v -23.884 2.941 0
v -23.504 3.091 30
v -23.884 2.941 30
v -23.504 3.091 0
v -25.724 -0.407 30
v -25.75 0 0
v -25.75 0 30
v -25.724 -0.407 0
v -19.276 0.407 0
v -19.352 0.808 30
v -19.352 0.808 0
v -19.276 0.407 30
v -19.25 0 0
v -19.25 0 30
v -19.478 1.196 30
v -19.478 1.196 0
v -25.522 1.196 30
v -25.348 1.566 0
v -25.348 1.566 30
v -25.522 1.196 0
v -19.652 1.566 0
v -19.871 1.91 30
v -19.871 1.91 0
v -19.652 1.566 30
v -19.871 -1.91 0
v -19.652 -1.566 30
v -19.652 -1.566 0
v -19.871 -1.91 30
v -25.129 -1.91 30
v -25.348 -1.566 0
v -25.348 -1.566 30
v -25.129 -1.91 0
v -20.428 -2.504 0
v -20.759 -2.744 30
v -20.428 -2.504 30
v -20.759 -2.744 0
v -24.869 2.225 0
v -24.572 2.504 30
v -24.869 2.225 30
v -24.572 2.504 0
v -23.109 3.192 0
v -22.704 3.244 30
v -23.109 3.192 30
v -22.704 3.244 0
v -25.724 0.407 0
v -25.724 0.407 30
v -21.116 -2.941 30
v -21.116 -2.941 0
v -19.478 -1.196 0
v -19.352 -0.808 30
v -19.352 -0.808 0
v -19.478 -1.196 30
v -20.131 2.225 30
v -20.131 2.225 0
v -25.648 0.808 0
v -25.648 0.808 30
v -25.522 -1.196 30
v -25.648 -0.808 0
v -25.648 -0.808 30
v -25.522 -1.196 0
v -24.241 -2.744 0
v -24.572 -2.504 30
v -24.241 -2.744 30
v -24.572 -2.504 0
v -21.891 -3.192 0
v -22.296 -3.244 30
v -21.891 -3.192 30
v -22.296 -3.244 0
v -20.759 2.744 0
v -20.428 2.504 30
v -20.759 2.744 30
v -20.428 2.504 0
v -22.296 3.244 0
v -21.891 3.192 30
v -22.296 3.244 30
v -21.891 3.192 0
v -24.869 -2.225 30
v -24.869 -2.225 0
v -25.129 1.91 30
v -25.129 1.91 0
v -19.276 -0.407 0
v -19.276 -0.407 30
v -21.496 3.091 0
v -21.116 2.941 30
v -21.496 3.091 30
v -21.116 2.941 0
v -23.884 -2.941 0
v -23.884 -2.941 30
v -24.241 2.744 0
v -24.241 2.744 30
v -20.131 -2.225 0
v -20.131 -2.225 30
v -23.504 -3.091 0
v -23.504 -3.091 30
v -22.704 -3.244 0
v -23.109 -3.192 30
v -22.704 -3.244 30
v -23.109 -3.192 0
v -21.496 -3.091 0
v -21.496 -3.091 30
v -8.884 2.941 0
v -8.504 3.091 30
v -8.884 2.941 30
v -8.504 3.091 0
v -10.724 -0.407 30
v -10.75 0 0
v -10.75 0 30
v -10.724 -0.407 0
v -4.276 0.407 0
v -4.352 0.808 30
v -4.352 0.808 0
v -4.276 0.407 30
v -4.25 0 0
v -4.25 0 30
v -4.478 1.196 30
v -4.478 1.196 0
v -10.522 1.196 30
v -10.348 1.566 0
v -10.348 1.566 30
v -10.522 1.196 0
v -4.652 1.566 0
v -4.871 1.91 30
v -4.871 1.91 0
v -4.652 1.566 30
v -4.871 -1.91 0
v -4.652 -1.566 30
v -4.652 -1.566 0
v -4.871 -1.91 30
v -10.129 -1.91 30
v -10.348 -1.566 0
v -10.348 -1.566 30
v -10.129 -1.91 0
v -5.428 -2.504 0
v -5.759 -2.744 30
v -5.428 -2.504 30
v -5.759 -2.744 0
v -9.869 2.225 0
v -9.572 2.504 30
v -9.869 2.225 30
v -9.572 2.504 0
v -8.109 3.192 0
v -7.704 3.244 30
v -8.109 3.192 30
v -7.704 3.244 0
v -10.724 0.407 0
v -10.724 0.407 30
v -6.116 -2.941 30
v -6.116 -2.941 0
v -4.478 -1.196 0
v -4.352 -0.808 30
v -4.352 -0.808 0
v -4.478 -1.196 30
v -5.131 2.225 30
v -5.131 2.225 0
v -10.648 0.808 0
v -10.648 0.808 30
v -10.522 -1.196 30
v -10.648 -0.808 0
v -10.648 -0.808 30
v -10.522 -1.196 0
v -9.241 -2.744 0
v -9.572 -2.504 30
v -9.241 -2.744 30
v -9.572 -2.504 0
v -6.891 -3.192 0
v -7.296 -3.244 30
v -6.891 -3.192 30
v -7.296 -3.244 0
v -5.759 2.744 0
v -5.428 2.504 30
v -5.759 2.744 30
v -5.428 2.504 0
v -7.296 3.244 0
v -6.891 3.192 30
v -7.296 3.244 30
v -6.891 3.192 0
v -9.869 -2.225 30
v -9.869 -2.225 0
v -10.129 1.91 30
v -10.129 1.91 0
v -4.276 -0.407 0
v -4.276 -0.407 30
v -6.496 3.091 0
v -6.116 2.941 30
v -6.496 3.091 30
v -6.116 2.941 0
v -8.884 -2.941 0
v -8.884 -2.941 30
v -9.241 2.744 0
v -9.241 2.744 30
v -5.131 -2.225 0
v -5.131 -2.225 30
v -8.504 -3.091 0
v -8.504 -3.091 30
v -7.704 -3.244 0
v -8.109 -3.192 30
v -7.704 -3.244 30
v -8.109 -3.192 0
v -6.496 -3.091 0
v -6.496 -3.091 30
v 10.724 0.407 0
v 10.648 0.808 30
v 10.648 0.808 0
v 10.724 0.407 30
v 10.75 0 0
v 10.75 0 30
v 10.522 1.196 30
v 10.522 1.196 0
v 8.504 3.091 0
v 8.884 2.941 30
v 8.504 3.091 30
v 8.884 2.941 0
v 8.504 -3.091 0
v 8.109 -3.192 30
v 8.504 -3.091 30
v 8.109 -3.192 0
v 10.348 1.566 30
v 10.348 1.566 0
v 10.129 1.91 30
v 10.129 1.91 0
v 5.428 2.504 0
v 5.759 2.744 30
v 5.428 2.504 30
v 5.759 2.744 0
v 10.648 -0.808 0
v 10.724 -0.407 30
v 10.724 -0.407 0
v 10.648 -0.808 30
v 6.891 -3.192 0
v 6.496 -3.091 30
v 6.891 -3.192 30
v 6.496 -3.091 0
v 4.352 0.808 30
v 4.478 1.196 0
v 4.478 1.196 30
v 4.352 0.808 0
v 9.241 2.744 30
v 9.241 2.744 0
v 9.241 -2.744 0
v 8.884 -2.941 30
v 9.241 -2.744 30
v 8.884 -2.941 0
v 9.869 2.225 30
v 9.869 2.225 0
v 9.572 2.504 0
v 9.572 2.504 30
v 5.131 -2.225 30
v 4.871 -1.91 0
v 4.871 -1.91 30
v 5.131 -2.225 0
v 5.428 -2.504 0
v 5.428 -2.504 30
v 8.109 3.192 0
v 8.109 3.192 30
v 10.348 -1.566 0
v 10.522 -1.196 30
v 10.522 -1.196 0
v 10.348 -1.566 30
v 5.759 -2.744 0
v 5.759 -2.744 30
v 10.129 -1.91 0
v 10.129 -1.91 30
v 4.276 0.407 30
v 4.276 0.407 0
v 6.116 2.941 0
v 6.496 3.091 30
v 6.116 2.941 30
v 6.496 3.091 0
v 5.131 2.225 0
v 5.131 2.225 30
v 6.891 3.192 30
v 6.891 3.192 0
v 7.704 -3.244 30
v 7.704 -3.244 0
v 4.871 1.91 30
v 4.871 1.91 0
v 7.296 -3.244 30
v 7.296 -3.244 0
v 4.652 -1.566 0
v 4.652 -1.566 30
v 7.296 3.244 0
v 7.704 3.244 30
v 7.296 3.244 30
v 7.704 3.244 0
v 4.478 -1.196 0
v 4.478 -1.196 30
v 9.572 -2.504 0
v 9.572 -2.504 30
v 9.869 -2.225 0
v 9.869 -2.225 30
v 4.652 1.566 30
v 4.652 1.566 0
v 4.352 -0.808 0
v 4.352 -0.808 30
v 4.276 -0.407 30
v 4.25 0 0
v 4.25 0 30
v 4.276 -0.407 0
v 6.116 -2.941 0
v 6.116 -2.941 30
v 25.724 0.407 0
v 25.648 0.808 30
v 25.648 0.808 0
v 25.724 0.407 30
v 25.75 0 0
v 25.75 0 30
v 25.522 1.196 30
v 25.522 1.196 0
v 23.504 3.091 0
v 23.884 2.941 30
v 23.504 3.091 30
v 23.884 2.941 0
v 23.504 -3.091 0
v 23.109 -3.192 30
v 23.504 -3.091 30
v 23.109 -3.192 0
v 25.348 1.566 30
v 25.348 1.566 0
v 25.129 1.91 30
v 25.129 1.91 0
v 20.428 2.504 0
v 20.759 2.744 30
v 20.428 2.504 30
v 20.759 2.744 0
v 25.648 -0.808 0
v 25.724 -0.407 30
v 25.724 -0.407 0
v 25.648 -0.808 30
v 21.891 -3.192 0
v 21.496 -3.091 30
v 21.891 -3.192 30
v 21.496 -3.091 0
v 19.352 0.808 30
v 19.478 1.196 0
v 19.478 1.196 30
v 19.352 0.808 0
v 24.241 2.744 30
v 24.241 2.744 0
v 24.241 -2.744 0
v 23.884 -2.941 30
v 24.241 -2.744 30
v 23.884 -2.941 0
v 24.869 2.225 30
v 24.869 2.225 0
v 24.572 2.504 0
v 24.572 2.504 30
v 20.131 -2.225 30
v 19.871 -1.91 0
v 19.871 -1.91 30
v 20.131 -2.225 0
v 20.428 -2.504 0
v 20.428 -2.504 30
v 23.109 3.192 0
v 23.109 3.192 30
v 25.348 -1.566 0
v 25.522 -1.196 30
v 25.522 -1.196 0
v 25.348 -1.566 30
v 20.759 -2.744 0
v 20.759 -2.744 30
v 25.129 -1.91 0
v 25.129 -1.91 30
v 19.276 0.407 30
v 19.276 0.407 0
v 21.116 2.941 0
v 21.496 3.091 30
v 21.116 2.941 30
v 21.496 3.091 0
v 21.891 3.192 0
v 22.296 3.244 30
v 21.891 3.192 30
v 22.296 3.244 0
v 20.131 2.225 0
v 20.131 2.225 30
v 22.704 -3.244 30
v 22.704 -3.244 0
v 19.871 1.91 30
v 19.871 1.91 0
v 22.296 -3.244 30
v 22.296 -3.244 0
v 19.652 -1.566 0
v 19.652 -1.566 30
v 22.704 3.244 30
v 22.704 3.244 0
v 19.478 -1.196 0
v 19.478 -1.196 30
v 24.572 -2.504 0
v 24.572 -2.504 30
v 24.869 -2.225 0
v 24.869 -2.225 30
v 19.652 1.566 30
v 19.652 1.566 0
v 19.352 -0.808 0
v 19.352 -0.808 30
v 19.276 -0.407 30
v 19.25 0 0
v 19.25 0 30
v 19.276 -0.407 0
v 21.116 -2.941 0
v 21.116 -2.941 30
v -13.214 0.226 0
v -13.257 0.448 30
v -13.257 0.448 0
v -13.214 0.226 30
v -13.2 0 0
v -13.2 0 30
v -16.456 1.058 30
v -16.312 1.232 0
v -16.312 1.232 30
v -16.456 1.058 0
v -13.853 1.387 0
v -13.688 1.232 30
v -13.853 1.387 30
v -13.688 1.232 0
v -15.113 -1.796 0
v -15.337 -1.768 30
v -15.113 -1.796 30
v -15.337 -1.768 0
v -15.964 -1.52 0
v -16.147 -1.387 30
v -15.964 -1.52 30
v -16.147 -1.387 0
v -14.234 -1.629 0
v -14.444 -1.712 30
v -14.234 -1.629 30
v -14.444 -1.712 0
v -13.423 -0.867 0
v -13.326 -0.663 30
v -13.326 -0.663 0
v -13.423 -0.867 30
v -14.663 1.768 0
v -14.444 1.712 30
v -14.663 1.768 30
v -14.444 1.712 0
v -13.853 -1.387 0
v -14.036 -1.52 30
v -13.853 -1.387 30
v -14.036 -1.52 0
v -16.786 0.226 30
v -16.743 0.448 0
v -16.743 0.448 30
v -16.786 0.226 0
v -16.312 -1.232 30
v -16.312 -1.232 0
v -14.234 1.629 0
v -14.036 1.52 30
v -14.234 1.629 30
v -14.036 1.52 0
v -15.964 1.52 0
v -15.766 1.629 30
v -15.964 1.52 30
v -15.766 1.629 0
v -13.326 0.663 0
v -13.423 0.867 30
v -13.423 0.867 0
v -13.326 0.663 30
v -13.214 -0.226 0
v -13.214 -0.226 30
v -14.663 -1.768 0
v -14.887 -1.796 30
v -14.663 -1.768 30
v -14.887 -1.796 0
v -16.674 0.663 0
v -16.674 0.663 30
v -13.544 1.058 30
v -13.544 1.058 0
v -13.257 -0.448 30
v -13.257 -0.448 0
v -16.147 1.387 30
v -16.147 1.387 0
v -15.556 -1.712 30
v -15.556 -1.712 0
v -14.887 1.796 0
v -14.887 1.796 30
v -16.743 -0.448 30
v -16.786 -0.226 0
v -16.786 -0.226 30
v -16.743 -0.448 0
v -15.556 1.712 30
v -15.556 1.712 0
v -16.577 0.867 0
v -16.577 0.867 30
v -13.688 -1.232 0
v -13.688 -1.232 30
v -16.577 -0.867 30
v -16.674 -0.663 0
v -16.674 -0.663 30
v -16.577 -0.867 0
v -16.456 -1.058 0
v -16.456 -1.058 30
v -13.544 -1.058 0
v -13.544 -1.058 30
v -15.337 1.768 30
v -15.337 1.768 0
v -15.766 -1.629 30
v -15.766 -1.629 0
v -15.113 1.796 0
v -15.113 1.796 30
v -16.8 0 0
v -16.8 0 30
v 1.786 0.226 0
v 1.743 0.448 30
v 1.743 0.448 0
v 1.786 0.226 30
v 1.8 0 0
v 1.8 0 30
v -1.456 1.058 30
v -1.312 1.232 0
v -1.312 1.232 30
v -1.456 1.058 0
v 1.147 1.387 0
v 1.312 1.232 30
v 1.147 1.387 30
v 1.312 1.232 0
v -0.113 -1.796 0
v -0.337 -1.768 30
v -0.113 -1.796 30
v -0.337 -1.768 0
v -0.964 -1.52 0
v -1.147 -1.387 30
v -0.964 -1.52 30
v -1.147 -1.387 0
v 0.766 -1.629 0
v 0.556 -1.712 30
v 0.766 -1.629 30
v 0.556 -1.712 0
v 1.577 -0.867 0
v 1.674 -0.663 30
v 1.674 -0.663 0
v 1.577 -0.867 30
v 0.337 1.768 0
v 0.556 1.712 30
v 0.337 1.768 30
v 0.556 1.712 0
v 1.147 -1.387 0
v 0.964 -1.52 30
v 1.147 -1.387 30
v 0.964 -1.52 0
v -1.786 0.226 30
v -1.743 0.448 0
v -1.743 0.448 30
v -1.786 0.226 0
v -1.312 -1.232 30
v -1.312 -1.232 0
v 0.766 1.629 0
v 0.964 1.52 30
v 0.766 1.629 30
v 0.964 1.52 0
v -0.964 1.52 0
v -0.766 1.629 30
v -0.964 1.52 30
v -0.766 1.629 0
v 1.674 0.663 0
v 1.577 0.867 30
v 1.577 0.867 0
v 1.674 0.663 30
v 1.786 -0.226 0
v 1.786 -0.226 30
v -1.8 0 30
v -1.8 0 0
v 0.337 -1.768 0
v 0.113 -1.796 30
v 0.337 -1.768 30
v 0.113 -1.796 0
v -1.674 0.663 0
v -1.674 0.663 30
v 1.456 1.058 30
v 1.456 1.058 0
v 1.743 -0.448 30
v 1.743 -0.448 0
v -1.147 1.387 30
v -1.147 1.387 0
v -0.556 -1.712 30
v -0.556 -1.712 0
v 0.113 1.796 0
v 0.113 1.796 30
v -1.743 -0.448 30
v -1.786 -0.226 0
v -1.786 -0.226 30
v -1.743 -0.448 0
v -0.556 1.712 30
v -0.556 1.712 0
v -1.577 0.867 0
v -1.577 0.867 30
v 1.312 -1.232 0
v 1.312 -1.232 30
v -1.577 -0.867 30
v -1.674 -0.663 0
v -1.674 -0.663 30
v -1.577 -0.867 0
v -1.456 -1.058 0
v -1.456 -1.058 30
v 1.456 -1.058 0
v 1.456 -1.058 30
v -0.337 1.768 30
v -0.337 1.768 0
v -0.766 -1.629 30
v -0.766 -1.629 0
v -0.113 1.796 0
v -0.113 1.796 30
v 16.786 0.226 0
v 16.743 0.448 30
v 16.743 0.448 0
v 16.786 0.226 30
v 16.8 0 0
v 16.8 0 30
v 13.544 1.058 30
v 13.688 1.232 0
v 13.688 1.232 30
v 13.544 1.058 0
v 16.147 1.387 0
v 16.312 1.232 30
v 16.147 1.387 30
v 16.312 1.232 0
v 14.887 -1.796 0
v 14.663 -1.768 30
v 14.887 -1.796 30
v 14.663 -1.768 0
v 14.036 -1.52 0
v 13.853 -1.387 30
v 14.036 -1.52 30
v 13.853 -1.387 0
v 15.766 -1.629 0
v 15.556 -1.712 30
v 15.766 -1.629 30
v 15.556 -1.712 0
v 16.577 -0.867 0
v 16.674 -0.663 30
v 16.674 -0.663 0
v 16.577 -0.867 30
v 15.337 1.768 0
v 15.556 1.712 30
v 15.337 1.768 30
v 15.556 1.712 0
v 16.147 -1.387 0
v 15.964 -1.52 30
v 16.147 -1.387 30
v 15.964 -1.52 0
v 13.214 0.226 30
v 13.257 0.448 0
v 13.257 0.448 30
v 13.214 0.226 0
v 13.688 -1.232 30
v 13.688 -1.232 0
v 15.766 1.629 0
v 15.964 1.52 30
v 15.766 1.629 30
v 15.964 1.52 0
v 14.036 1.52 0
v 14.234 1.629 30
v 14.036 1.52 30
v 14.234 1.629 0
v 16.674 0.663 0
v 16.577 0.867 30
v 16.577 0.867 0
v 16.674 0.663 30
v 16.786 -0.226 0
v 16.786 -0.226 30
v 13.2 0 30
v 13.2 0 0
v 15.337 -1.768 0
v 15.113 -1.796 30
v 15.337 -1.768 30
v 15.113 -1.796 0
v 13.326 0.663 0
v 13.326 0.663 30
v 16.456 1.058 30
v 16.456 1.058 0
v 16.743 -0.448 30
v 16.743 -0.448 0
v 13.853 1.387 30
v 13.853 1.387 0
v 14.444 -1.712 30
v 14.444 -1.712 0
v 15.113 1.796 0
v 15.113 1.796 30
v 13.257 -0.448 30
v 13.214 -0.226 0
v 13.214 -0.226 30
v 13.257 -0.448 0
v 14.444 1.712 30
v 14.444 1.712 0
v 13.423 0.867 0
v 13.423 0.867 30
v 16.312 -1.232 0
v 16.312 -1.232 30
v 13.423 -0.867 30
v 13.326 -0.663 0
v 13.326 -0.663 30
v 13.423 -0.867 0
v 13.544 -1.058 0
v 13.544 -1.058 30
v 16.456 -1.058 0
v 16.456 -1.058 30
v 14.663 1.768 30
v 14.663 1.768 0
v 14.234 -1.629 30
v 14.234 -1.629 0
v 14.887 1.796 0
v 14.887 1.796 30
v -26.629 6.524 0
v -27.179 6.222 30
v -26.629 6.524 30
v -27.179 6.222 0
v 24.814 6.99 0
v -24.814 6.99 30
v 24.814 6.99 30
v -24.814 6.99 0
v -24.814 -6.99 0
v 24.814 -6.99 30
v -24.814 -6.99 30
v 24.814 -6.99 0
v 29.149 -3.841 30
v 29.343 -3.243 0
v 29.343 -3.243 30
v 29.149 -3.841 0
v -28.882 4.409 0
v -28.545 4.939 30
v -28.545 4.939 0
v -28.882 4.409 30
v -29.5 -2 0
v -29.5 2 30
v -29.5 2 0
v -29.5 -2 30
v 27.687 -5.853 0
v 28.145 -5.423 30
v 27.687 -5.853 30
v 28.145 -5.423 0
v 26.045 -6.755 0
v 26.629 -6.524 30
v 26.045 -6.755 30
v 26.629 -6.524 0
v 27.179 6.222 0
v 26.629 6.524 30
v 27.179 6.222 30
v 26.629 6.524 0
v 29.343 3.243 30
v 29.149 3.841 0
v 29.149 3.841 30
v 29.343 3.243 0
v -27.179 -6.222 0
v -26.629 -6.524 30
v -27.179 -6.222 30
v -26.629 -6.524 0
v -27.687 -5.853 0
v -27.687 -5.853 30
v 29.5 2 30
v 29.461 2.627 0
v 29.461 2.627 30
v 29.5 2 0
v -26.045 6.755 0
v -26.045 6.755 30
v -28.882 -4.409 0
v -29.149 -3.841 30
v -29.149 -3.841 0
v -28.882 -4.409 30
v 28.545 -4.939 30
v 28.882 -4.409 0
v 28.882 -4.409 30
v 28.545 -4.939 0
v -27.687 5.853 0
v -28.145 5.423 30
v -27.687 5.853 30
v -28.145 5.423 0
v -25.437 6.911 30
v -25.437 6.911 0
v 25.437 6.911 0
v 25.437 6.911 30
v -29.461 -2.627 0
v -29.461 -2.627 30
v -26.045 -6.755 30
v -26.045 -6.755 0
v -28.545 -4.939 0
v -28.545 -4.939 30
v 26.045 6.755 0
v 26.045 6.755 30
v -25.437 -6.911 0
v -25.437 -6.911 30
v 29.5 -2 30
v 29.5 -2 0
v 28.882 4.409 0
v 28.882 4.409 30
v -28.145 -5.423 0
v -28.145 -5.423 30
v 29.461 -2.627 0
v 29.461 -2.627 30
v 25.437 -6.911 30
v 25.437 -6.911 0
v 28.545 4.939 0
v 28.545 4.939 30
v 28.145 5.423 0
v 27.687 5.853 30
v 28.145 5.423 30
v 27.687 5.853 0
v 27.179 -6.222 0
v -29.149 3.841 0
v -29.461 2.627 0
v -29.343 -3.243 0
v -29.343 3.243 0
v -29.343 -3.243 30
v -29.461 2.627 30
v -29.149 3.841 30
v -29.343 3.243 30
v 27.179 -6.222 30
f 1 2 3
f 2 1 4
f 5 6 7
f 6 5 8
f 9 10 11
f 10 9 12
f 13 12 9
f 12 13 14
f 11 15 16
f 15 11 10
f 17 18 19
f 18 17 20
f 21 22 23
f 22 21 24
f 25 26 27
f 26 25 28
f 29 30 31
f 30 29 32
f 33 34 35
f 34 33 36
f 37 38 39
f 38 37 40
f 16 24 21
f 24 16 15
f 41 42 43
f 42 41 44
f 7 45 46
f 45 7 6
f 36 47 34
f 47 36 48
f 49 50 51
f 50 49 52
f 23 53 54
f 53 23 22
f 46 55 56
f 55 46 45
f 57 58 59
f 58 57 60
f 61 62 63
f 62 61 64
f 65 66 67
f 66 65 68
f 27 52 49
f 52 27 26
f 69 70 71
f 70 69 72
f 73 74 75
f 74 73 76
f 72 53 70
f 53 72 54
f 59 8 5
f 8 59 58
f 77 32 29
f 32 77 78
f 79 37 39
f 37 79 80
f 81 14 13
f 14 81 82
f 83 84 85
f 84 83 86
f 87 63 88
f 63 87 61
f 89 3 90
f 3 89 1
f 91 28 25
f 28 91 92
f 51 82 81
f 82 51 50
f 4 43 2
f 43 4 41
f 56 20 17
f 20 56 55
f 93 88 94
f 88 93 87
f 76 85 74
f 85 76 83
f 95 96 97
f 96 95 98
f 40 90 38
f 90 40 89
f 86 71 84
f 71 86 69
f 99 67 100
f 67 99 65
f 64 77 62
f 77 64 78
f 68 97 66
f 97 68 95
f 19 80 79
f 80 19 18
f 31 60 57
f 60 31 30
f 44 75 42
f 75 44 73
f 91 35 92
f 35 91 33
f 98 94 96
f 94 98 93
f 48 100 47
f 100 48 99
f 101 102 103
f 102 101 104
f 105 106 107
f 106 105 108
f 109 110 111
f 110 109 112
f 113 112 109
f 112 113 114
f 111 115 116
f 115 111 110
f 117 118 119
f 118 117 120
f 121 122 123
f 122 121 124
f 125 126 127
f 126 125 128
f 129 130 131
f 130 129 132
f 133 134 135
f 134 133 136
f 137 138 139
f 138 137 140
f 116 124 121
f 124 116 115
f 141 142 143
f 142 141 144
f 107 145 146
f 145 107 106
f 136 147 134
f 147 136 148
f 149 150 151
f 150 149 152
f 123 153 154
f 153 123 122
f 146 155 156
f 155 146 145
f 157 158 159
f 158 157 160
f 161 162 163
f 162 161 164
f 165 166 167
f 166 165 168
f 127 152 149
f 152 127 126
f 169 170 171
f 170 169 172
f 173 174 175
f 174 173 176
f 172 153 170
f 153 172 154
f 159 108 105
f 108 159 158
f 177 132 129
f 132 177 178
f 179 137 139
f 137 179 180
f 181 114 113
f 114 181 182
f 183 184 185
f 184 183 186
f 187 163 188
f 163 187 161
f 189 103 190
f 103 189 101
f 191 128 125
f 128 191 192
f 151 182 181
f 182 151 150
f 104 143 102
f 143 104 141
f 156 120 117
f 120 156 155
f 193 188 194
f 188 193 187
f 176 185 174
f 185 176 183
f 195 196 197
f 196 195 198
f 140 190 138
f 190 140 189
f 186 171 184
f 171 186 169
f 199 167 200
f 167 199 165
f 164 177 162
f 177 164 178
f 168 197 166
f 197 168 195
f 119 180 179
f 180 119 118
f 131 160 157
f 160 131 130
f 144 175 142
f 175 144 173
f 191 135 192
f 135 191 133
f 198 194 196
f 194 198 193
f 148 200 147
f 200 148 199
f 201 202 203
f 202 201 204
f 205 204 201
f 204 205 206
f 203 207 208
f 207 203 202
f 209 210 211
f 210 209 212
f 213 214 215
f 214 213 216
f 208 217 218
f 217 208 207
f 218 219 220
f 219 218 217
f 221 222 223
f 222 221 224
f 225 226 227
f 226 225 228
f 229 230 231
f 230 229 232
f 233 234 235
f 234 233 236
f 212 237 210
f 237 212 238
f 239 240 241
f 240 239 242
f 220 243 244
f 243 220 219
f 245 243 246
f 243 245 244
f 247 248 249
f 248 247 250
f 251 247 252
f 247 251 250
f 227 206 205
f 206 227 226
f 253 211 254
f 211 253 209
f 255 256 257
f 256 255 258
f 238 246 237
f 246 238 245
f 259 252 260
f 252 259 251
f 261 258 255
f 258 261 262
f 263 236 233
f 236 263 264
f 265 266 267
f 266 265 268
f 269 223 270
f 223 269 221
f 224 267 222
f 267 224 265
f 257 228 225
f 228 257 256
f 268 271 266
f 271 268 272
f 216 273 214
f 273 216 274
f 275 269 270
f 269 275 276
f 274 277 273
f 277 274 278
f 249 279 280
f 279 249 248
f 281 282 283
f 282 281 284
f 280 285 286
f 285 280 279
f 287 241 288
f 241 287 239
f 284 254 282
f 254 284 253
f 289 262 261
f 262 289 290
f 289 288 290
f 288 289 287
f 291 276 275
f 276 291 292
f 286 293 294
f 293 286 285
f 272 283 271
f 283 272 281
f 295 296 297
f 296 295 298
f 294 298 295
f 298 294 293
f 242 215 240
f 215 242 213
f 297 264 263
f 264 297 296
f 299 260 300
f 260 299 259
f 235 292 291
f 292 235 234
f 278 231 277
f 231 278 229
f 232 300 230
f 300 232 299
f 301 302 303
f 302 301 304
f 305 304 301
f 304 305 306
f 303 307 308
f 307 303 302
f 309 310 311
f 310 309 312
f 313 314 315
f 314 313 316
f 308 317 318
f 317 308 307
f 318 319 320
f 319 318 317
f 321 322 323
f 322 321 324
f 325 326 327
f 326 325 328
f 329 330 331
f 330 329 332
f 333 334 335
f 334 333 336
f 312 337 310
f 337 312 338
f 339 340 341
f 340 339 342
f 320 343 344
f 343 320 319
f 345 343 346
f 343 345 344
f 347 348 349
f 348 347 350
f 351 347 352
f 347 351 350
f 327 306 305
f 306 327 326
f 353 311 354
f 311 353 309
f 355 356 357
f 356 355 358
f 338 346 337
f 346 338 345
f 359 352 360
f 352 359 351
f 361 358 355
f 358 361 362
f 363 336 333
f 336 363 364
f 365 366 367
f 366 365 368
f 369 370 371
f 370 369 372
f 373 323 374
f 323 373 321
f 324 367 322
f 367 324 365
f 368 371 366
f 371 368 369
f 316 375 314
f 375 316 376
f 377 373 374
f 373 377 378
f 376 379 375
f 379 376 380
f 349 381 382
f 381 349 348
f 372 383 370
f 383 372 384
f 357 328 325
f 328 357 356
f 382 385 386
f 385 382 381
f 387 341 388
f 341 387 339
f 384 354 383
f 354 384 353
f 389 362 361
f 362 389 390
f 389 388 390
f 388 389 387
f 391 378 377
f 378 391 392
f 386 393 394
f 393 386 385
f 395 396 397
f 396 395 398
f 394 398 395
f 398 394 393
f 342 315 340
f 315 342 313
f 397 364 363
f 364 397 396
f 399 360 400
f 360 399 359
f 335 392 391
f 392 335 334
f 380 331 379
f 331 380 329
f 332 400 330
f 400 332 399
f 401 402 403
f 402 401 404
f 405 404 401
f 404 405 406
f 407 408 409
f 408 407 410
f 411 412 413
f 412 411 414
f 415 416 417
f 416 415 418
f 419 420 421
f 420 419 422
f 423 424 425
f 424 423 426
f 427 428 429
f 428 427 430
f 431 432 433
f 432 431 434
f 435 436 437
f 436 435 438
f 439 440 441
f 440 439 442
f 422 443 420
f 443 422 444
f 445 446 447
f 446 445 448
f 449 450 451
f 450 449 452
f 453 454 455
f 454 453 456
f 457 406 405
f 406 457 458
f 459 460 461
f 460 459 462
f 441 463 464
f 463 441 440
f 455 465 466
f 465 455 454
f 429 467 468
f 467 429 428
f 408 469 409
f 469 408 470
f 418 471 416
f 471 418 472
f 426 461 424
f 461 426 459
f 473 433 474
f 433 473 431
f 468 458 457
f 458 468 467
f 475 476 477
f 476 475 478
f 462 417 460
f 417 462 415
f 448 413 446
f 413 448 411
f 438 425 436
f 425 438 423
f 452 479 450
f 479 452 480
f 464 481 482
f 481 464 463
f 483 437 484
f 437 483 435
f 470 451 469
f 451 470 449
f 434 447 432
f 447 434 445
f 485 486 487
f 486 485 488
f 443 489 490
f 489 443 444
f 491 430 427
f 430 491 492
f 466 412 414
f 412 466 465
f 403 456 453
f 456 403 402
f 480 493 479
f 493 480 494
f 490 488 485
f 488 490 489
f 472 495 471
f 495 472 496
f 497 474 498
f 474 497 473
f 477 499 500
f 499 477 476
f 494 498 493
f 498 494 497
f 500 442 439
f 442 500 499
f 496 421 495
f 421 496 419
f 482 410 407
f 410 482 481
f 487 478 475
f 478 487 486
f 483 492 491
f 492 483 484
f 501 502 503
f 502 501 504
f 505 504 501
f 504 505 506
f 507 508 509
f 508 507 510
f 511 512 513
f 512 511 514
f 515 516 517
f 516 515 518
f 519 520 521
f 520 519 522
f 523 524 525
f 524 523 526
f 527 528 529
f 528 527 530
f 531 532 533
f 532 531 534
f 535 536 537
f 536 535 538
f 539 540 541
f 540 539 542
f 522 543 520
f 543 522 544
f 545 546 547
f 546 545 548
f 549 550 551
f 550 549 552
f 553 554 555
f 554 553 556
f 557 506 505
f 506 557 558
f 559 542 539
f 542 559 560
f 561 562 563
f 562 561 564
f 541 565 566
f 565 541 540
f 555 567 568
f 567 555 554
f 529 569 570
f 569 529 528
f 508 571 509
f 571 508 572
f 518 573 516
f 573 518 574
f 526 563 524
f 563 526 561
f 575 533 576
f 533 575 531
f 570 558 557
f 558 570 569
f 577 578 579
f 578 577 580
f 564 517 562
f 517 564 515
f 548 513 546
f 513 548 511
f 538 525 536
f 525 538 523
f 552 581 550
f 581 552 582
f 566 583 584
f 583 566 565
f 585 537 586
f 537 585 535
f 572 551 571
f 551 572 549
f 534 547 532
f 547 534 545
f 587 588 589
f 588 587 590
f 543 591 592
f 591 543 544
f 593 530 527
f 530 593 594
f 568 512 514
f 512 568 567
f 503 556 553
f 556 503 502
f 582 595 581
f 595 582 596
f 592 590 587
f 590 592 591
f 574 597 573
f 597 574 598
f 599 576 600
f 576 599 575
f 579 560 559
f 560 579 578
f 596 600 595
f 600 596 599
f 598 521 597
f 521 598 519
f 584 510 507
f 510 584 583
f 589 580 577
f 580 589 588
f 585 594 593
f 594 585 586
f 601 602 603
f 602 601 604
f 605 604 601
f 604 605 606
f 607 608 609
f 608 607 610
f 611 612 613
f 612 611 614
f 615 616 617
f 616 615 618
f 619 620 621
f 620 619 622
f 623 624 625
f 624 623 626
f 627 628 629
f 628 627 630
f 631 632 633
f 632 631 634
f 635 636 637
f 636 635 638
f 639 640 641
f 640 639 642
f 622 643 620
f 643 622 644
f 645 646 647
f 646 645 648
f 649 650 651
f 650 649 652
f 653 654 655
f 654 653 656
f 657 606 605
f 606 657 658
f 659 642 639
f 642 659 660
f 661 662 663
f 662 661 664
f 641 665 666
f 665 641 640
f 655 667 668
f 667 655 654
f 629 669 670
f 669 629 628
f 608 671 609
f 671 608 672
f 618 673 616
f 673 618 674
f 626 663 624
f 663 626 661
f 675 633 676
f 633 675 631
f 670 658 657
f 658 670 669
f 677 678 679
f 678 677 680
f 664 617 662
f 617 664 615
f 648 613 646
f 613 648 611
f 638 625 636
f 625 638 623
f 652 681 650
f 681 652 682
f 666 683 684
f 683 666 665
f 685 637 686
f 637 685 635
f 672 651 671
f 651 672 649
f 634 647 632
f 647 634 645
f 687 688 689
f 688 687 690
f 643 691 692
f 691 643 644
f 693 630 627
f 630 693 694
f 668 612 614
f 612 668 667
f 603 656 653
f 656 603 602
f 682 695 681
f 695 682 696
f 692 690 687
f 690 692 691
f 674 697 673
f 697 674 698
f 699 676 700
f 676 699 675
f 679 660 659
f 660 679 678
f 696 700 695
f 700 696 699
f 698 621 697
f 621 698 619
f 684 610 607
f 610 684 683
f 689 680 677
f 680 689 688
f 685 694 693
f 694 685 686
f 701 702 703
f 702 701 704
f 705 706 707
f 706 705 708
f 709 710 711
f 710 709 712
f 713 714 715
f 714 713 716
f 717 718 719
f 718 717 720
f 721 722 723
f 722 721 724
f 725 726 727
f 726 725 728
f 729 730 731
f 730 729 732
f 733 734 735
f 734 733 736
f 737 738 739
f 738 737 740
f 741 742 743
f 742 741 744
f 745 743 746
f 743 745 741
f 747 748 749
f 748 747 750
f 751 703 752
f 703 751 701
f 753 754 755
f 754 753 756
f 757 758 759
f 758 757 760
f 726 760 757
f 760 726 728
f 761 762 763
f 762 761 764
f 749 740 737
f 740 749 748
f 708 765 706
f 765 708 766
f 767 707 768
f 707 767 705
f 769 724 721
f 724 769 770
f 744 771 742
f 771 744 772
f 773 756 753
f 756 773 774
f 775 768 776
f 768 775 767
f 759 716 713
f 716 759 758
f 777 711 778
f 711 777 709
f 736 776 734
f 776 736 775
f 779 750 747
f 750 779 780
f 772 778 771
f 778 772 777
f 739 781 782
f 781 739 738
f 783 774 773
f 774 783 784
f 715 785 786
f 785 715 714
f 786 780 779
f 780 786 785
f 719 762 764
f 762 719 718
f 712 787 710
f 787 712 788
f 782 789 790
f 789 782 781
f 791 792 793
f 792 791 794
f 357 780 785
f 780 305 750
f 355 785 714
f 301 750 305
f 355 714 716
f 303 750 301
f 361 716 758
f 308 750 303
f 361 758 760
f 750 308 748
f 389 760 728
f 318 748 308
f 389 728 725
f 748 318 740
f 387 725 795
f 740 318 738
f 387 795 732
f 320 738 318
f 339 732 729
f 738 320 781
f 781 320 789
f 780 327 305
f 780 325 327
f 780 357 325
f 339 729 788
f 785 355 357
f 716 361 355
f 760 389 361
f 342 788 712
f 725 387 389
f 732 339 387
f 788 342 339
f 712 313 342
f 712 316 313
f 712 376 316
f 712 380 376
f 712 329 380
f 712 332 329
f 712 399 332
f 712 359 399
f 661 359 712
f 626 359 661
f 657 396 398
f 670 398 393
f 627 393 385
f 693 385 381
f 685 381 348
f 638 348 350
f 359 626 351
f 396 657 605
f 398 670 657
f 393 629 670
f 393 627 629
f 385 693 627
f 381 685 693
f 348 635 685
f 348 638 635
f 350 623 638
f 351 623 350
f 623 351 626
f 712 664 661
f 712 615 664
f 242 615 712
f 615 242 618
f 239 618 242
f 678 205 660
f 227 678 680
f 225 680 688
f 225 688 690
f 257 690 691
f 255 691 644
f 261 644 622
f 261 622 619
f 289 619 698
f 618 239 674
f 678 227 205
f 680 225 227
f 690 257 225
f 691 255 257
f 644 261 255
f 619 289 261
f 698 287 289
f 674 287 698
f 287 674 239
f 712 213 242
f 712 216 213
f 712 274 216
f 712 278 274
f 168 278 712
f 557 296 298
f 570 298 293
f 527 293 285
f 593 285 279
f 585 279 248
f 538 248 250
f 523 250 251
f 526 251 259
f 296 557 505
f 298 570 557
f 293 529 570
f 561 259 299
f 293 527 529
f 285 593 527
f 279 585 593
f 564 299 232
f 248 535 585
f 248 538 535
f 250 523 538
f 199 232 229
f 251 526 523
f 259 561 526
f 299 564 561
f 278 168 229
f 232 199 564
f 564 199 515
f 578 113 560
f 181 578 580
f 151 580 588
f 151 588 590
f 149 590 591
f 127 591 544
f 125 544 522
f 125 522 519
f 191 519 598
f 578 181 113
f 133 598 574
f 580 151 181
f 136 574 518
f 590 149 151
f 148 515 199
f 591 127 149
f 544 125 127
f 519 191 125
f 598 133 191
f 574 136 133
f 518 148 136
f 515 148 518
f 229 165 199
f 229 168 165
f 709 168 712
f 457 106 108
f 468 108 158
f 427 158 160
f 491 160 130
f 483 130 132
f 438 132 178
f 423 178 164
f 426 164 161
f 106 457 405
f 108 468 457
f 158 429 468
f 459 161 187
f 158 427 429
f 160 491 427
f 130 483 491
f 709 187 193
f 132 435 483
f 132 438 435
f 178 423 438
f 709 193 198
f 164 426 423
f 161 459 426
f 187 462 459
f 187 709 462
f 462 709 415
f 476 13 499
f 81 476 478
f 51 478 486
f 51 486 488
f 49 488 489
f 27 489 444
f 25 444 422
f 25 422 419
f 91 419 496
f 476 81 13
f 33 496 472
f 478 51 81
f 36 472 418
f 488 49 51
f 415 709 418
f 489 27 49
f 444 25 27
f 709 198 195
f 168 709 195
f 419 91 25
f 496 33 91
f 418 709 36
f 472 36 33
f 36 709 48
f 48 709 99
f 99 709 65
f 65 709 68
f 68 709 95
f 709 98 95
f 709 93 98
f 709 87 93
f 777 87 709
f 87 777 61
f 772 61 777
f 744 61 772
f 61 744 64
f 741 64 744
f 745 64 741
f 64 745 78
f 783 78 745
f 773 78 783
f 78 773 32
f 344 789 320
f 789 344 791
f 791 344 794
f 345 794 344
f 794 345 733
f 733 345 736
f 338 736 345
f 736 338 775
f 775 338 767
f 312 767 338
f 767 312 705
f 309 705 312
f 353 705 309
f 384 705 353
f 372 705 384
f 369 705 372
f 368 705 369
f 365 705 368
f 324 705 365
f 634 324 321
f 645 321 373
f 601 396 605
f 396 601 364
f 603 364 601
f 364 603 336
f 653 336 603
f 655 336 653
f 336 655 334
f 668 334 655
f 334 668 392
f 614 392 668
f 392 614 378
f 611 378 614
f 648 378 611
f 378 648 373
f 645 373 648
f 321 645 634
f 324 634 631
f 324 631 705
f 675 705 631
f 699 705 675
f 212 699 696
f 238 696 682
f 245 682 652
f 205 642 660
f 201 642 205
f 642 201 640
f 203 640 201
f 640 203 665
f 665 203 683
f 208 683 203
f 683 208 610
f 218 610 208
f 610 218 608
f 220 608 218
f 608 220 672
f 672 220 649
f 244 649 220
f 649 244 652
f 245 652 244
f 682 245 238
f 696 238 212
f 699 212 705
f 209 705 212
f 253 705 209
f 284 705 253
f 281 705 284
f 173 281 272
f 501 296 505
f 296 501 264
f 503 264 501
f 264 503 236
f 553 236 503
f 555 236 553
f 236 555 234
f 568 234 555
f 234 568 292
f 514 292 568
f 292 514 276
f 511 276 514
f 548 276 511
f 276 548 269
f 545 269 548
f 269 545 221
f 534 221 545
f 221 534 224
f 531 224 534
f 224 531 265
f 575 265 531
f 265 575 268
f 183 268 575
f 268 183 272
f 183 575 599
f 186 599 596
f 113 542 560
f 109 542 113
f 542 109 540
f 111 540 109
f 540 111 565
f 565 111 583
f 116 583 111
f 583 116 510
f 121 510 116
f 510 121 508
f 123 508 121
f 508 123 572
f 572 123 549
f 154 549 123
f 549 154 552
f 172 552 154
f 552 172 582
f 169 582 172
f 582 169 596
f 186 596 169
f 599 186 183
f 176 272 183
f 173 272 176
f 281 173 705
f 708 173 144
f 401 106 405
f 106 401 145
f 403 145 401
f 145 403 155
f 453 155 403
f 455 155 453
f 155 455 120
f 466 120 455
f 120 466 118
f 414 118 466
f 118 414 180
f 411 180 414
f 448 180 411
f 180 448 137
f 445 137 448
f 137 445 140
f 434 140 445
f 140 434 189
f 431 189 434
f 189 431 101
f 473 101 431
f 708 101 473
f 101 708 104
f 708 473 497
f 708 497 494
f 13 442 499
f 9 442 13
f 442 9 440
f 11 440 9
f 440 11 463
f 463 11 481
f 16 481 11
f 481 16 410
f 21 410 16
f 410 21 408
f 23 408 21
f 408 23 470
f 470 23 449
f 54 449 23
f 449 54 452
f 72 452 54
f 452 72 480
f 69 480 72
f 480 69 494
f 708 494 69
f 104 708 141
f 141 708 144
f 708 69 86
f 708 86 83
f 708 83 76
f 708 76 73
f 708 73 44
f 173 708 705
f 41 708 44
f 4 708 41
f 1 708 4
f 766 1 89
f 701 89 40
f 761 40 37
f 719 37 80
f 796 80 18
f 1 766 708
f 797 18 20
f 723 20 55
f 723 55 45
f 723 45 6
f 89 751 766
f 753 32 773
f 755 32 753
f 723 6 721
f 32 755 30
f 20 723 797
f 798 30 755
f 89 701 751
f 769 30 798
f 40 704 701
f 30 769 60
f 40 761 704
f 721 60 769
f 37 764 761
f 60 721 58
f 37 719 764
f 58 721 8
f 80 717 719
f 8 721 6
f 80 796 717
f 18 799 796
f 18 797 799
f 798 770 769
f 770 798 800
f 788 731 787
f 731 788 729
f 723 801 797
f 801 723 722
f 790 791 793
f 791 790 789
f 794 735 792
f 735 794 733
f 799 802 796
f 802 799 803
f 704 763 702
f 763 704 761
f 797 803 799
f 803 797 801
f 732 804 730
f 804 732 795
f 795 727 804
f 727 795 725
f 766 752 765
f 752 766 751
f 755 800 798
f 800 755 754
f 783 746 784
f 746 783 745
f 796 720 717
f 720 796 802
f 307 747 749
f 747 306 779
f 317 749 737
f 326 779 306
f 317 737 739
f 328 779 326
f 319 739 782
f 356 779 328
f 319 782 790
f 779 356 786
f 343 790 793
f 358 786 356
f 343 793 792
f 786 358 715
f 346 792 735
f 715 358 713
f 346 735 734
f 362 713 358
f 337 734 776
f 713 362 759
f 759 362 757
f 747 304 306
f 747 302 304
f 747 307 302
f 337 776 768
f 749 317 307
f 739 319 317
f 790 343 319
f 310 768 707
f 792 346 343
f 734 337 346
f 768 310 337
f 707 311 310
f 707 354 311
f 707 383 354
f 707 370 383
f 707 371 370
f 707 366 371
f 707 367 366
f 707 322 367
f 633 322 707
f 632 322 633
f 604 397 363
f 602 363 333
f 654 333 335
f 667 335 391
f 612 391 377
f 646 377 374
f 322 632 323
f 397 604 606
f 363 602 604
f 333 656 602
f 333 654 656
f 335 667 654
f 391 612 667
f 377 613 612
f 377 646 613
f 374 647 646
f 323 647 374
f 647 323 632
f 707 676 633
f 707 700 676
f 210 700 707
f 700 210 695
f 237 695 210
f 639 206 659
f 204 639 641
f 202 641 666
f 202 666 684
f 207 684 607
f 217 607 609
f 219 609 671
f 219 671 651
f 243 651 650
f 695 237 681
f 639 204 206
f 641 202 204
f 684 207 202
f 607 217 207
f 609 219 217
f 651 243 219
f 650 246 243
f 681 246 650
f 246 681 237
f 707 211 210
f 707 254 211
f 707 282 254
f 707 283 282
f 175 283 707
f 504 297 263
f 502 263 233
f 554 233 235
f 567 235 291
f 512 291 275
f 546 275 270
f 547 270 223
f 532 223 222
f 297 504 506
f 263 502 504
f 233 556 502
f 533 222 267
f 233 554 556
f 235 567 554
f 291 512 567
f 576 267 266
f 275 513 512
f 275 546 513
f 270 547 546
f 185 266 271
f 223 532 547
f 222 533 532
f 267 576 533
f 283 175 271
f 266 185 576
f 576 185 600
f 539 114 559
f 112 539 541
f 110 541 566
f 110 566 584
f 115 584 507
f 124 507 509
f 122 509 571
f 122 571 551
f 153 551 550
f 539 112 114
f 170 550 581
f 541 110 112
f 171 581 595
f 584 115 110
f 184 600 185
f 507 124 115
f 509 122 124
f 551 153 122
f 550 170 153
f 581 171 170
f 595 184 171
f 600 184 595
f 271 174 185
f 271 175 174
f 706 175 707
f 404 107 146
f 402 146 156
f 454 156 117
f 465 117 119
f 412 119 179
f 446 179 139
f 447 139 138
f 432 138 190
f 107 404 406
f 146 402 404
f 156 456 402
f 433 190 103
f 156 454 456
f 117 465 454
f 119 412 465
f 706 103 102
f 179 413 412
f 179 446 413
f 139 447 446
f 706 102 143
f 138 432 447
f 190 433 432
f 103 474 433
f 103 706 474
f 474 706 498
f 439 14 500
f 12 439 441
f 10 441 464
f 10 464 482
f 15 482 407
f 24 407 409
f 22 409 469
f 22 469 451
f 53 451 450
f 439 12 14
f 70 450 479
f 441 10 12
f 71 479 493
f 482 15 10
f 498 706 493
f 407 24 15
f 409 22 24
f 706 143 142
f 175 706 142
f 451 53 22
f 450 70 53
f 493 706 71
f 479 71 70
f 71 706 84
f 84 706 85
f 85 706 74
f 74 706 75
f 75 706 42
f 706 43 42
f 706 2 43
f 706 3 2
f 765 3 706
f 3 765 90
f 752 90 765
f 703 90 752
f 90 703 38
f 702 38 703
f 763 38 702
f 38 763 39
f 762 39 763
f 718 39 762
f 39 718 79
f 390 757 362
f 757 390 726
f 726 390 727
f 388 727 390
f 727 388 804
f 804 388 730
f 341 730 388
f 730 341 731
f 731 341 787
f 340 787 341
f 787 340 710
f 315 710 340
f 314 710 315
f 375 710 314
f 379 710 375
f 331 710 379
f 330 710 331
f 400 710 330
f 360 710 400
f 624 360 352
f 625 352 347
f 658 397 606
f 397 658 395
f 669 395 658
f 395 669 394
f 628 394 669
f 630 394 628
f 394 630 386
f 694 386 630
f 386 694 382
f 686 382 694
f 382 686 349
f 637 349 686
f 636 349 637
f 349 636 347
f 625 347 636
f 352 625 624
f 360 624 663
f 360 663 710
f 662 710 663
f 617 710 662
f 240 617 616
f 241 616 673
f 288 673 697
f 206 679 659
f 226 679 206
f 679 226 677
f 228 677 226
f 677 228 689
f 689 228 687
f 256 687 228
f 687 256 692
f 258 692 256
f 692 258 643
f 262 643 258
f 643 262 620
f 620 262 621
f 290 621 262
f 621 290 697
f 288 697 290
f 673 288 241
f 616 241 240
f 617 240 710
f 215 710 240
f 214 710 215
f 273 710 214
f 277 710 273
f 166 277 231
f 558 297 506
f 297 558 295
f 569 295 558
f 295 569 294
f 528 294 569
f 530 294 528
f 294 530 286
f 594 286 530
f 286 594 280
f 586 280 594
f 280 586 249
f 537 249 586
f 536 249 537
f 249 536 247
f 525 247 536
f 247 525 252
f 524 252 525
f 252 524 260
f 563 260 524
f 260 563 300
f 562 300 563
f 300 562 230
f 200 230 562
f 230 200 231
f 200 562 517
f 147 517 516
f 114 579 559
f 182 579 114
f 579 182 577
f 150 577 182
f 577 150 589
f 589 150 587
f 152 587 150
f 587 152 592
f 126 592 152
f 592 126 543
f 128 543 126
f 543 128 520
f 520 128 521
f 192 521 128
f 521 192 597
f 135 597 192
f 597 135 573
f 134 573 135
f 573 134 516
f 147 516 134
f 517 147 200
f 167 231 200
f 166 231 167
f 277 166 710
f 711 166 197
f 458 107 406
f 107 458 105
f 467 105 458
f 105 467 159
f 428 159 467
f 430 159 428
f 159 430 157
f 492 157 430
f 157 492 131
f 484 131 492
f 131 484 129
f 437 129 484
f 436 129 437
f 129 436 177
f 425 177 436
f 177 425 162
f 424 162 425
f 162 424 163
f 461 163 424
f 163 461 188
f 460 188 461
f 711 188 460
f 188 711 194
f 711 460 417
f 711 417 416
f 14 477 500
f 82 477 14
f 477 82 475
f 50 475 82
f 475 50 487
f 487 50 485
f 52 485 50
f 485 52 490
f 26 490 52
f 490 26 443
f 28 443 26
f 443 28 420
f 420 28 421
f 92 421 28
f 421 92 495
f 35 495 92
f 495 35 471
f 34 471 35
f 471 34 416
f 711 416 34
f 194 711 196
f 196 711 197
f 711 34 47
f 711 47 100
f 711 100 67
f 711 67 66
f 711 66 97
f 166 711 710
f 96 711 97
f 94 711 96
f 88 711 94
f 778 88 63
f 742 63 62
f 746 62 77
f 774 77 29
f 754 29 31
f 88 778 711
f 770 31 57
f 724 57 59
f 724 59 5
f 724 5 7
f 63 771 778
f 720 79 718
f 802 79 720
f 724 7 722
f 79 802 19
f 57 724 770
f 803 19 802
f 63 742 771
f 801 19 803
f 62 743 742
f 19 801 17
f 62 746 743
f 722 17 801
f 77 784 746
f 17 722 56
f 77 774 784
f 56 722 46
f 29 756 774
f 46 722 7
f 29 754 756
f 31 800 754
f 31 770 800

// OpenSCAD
$fn = 50;


difference() {
	union() {
		*color(alpha = 1.0000000000, c = "gray") {
			translate(v = [0, 7, 0]) {
				linear_extrude(height = 1) {
					text(font = "Arial:style=Bold", halign = "center", size = 4.5000000000, text = "COMMENT plate main", valign = "center");
				}
			}
		}
		hull() {
			translate(v = [-24.5000000000, 2.0000000000, 0]) {
				cylinder(h = 30, r = 5);
			}
			translate(v = [24.5000000000, 2.0000000000, 0]) {
				cylinder(h = 30, r = 5);
			}
			translate(v = [-24.5000000000, -2.0000000000, 0]) {
				cylinder(h = 30, r = 5);
			}
			translate(v = [24.5000000000, -2.0000000000, 0]) {
				cylinder(h = 30, r = 5);
			}
		}
	}
	union() {
		*color(alpha = 1.0000000000, c = "gray") {
			translate(v = [0, 7, 0]) {
				linear_extrude(height = 1) {
					text(font = "Arial:style=Bold", halign = "center", size = 4.5000000000, text = "COMMENT holes main", valign = "center");
				}
			}
		}
		translate(v = [-22.5000000000, 0.0000000000, 0]) {
			translate(v = [0, 0, -100]) {
				cylinder(h = 200, r = 3.2500000000);
			}
		}
		translate(v = [-7.5000000000, 0.0000000000, 0]) {
			translate(v = [0, 0, -100]) {
				cylinder(h = 200, r = 3.2500000000);
			}
		}
		translate(v = [7.5000000000, 0.0000000000, 0]) {
			translate(v = [0, 0, -100]) {
				cylinder(h = 200, r = 3.2500000000);
			}
		}
		translate(v = [22.5000000000, 0.0000000000, 0]) {
			translate(v = [0, 0, -100]) {
				cylinder(h = 200, r = 3.2500000000);
			}
		}
		translate(v = [-22.5000000000, 0.0000000000, 0]) {
			translate(v = [0, 0, -100]) {
				cylinder(h = 200, r = 1.8000000000);
			}
		}
		translate(v = [-15.0000000000, 0.0000000000, 0]) {
			translate(v = [0, 0, -100]) {
				cylinder(h = 200, r = 1.8000000000);
			}
		}
		translate(v = [-7.5000000000, 0.0000000000, 0]) {
			translate(v = [0, 0, -100]) {
				cylinder(h = 200, r = 1.8000000000);
			}
		}
		translate(v = [0, 0, -100]) {
			cylinder(h = 200, r = 1.8000000000);
		}
		translate(v = [7.5000000000, 0.0000000000, 0]) {
			translate(v = [0, 0, -100]) {
				cylinder(h = 200, r = 1.8000000000);
			}
		}
		translate(v = [15.0000000000, 0.0000000000, 0]) {
			translate(v = [0, 0, -100]) {
				cylinder(h = 200, r = 1.8000000000);
			}
		}
		translate(v = [22.5000000000, 0.0000000000, 0]) {
			translate(v = [0, 0, -100]) {
				cylinder(h = 200, r = 1.8000000000);
			}
		}
	}
}
